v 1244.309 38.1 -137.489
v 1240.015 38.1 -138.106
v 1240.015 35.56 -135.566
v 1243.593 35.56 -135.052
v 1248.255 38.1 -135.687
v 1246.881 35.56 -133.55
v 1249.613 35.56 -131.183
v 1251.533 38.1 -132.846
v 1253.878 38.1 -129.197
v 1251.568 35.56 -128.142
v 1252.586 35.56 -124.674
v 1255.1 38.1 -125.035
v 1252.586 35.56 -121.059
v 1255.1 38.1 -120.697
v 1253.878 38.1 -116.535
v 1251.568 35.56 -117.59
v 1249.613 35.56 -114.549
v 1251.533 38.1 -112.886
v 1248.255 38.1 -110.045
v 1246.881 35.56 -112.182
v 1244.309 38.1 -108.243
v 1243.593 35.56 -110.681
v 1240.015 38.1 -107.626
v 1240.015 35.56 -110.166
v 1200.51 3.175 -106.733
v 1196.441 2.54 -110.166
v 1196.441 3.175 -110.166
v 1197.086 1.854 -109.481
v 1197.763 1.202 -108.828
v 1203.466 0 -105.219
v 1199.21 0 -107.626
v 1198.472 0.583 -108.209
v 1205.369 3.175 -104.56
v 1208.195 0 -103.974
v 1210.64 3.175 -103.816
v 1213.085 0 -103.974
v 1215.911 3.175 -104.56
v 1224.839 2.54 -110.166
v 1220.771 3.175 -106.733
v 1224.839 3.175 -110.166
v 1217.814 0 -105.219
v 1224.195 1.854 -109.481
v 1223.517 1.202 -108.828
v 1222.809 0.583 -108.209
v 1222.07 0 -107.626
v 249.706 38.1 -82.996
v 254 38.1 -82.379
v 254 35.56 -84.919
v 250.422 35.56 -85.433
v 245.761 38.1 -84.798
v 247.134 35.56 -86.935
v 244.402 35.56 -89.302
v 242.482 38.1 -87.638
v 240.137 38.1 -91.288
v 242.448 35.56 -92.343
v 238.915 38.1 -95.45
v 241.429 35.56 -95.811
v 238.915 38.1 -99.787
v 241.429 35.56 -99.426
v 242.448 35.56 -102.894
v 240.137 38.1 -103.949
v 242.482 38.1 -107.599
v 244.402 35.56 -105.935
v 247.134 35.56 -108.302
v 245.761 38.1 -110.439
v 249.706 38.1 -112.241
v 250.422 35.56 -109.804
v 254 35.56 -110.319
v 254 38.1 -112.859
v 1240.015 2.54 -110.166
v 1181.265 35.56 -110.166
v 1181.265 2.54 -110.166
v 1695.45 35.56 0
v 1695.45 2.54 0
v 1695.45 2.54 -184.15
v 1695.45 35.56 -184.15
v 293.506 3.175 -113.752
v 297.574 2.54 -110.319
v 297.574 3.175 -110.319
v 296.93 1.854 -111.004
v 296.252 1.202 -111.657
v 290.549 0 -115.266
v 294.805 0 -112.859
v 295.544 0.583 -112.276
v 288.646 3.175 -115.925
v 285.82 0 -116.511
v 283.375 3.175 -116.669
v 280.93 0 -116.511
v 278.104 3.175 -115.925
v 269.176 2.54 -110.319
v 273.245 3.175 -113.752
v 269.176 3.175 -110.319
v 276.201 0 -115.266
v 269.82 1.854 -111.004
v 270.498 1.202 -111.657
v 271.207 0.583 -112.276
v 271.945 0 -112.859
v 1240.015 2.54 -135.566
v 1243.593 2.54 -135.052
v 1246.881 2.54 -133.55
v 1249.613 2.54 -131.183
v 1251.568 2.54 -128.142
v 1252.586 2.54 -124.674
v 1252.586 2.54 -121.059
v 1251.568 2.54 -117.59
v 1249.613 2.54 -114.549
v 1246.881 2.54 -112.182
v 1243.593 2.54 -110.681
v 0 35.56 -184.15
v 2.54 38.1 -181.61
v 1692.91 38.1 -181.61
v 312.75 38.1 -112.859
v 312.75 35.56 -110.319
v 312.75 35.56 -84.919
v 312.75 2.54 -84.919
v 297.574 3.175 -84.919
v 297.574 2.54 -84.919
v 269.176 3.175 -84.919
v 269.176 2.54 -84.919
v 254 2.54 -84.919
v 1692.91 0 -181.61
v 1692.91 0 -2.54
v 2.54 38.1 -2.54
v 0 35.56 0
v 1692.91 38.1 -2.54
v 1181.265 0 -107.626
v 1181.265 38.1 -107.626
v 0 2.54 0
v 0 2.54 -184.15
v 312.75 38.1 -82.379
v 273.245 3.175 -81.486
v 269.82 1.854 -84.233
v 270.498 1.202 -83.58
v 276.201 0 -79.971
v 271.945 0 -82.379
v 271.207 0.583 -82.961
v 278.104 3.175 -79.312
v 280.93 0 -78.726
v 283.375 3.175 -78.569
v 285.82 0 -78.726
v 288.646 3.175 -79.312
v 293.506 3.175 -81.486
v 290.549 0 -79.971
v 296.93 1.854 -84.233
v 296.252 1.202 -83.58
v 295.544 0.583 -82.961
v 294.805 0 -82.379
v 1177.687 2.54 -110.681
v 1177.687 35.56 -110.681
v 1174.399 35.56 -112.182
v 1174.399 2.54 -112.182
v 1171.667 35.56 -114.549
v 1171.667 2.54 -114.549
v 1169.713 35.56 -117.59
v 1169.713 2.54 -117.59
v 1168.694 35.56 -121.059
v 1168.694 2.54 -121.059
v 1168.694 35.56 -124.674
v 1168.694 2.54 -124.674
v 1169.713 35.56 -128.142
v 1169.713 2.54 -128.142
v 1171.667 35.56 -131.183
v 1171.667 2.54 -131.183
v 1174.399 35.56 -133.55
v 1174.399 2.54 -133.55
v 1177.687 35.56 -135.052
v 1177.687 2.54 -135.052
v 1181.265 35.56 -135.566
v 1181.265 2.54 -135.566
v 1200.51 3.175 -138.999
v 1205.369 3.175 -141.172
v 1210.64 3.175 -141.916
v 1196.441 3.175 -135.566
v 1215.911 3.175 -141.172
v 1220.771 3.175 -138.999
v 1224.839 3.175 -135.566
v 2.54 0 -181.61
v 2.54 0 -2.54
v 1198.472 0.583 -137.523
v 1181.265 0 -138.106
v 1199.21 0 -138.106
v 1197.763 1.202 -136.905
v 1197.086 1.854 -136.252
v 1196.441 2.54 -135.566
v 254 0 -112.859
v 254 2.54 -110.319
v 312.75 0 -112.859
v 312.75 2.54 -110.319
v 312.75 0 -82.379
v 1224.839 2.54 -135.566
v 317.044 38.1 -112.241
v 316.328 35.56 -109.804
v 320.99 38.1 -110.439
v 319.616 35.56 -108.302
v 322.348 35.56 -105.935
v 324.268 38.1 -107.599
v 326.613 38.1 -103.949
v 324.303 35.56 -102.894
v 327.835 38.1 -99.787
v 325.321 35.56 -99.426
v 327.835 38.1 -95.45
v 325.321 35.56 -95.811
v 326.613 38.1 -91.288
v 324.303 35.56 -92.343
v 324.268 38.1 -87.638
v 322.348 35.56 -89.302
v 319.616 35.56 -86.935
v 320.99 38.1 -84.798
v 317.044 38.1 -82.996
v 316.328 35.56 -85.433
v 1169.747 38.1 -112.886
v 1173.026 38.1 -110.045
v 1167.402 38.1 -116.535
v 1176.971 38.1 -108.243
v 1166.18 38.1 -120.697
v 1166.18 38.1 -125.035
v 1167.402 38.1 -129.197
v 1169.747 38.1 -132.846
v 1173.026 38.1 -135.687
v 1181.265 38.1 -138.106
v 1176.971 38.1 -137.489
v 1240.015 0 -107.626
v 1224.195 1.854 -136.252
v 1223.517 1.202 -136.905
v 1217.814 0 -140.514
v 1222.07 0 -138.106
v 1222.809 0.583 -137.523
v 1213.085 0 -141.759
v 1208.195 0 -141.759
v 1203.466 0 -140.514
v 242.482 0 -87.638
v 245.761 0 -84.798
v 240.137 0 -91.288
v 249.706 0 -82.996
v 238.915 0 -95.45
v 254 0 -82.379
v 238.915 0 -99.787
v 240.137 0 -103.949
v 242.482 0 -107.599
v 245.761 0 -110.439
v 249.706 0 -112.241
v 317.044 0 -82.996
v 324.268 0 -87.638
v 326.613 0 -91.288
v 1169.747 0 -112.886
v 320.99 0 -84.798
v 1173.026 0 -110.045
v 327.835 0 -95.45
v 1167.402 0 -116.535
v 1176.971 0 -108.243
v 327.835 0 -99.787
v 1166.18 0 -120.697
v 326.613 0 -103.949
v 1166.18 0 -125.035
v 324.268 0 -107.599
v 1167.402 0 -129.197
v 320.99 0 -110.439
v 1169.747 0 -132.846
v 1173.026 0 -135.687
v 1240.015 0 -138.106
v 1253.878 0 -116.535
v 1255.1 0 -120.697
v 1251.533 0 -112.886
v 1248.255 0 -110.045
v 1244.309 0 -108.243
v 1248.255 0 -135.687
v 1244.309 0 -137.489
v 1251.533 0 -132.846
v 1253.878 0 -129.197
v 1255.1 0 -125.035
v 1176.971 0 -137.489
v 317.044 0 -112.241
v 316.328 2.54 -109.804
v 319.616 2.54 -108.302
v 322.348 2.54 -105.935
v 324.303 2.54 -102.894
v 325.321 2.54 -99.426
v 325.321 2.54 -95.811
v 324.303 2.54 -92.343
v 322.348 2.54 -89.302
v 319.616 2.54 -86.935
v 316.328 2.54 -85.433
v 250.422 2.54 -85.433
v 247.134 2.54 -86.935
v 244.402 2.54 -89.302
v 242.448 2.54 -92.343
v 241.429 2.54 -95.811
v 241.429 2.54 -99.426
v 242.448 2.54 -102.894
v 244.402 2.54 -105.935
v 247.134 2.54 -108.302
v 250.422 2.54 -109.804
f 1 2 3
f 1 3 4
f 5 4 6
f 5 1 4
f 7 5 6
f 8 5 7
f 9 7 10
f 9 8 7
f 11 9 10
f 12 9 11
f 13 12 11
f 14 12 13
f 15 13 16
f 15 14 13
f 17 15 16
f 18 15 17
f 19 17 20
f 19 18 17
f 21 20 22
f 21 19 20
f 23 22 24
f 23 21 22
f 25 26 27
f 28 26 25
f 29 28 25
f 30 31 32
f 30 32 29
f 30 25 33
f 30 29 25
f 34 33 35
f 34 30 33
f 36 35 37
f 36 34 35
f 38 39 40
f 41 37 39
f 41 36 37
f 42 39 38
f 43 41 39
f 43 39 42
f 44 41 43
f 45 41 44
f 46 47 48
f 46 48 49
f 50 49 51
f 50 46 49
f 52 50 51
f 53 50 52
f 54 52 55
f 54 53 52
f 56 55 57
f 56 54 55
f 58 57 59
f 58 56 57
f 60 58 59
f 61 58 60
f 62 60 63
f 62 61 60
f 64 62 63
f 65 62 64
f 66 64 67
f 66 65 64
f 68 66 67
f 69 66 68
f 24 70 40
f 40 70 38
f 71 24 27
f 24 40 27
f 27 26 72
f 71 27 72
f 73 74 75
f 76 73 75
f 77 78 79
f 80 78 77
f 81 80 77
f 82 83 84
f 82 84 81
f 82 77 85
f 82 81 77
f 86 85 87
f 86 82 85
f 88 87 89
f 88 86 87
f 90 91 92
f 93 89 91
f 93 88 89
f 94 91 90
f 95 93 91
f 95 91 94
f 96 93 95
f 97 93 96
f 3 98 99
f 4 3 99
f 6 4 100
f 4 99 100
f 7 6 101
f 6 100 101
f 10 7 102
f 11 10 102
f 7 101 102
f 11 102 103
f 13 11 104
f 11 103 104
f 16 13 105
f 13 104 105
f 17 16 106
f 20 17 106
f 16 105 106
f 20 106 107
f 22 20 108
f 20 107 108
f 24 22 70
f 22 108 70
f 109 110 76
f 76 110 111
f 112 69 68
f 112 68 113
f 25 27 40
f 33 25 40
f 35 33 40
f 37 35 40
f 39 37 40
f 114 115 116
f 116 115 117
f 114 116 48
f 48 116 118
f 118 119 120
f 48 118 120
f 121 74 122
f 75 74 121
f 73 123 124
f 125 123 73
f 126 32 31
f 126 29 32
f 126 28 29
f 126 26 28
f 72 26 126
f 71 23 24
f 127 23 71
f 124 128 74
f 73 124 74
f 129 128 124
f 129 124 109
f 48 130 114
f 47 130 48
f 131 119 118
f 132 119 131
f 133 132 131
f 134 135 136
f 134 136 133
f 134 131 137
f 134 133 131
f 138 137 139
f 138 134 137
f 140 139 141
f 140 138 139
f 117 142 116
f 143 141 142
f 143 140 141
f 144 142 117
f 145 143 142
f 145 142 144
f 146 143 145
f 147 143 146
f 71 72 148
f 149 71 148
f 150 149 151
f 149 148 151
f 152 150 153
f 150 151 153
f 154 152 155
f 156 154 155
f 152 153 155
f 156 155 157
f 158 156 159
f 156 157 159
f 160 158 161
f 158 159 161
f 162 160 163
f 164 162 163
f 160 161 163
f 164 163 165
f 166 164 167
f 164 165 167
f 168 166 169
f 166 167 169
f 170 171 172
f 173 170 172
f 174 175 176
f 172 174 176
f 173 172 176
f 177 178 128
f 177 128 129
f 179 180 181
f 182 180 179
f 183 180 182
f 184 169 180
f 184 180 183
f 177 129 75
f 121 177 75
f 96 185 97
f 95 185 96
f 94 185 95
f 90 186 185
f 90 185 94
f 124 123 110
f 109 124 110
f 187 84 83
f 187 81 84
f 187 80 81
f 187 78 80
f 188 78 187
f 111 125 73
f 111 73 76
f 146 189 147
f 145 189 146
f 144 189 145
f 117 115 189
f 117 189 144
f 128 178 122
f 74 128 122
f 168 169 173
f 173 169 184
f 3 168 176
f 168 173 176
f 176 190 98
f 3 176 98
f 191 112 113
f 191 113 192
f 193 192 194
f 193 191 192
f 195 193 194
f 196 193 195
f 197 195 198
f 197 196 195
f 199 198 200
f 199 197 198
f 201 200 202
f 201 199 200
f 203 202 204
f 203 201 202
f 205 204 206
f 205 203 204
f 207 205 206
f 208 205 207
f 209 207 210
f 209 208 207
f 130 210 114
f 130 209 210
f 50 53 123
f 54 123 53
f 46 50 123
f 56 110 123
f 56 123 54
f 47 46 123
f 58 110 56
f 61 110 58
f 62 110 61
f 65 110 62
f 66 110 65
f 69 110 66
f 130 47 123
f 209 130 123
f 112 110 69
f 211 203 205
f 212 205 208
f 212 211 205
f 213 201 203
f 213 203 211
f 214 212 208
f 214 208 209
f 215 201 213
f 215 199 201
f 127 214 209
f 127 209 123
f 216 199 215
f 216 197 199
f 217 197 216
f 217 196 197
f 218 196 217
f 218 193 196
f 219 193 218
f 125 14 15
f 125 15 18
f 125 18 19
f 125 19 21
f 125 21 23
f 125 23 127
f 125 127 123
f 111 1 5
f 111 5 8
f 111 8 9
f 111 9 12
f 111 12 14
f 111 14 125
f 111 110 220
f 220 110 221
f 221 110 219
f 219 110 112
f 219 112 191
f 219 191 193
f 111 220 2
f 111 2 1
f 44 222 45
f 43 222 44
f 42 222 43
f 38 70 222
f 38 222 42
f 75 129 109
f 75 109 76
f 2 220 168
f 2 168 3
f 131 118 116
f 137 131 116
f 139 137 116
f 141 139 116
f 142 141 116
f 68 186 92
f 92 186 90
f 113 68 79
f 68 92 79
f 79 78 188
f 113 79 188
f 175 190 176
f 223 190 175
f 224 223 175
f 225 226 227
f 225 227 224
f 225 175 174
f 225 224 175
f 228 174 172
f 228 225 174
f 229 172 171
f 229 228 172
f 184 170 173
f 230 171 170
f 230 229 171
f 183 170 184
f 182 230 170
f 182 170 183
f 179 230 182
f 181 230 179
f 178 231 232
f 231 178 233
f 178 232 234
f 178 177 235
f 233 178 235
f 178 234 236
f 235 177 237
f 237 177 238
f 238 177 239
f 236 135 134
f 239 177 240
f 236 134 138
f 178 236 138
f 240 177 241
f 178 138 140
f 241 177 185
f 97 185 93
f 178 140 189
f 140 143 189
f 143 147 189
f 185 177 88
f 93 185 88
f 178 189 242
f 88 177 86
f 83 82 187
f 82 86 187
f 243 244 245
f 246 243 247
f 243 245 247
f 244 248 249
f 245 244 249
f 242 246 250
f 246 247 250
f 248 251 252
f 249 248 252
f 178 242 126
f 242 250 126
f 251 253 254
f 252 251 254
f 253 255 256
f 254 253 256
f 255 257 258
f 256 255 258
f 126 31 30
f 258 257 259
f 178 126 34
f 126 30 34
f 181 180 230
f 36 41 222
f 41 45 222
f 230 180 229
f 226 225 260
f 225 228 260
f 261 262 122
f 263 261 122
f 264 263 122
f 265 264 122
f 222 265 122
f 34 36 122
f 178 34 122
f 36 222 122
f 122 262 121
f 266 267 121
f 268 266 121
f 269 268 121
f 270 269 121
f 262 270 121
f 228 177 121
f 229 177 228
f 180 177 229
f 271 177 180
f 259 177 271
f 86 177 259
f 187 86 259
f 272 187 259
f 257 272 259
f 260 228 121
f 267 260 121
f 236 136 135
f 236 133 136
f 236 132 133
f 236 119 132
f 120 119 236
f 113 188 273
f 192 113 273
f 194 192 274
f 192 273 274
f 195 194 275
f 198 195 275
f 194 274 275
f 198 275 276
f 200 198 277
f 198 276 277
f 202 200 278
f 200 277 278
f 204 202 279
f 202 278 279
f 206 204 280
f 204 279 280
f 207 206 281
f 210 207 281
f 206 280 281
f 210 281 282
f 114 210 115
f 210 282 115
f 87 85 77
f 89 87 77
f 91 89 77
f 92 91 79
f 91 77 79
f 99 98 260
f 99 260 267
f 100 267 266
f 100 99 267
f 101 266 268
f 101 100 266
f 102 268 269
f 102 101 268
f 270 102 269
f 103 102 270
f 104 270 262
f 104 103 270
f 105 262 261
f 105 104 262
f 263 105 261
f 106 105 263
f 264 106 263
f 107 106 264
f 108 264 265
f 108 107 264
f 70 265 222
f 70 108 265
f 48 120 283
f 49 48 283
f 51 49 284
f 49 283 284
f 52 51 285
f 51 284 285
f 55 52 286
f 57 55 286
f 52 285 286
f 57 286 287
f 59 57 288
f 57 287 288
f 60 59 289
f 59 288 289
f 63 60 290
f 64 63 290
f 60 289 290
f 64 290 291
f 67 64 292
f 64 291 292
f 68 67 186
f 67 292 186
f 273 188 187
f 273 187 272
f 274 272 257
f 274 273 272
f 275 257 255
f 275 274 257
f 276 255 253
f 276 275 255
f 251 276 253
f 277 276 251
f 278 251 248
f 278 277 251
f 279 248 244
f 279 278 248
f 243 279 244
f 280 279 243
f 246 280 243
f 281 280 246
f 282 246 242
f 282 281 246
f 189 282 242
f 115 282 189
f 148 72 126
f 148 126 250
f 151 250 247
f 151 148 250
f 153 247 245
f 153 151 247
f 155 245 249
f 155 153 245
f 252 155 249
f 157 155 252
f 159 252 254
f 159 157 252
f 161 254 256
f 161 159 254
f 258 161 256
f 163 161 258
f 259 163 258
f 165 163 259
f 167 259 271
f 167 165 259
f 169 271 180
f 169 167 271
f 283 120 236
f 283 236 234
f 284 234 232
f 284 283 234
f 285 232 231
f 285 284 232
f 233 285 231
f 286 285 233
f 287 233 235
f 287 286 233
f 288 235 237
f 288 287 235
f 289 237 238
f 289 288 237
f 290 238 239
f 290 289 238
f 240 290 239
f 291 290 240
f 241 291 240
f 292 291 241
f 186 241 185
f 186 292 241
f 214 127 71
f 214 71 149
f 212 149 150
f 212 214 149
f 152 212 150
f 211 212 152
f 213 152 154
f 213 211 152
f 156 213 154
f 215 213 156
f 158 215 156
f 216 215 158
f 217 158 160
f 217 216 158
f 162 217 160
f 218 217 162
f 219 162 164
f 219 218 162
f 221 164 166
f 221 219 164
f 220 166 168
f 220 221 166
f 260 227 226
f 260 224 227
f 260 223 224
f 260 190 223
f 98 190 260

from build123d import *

# Parameters (mm, degrees)
SKETCH1_W           = 1695.45
SKETCH1_H           = 184.15
BOSS_EXTRUDE1_DEPTH = 38.1
CHAMFER1_SIZE       = 2.54
CHAMFER2_SIZE       = 2.54
SKETCH2_R           = 19.05
CUT_EXTRUDE1_DEPTH  = 3.175


with BuildPart() as part:
    # Sketch1 → Boss-Extrude1 (new body)
    with BuildSketch(Plane(origin=(0, 0, 0), x_dir=(1, 0, 0), z_dir=(0, 1, 0))):
        with Locations((847.725, 92.075)):
            Rectangle(SKETCH1_W, SKETCH1_H)
        with BuildLine():
            Line((1240.0153, 110.16615), (1181.2651, 110.16615))
            ThreePointArc((1181.2651, 110.16615), (1168.5651, 122.86615), (1181.2651, 135.56615))
            Line((1181.2651, 135.56615), (1240.0153, 135.56615))
            ThreePointArc((1240.0153, 135.56615), (1252.7153, 122.86615), (1240.0153, 110.16615))
        make_face(mode=Mode.SUBTRACT)
        with BuildLine():
            Line((254, 110.31855), (312.7502, 110.31855))
            ThreePointArc((312.7502, 110.31855), (325.4502, 97.61855), (312.7502, 84.91855))
            Line((312.7502, 84.91855), (254, 84.91855))
            ThreePointArc((254, 84.91855), (241.3, 97.61855), (254, 110.31855))
        make_face(mode=Mode.SUBTRACT)
    extrude(amount=BOSS_EXTRUDE1_DEPTH)

    # Chamfer1
    chamfer1_edges = [part.edges().sort_by_distance(p)[0] for p in [
        (1695.45, 38.1, -92.075),
        (1252.7153, 38.1, -122.86615),
        (847.725, 38.1, -184.15),
        (1210.6402, 38.1, -135.56615),
        (1168.5651, 38.1, -122.86615),
        (1210.6402, 38.1, -110.16615),
        (325.4502, 38.1, -97.61855),
        (283.3751, 38.1, -110.31855),
        (241.3, 38.1, -97.61855),
        (283.3751, 38.1, -84.91855),
        (0, 38.1, -92.075),
        (847.725, 38.1, 0),
    ]]
    chamfer(chamfer1_edges, length=CHAMFER1_SIZE)

    # Chamfer2
    chamfer2_edges = [part.edges().sort_by_distance(p)[0] for p in [
        (1252.7153, 0, -122.86615),
        (1210.6402, 0, -135.56615),
        (1168.5651, 0, -122.86615),
        (1210.6402, 0, -110.16615),
        (325.4502, 0, -97.61855),
        (283.3751, 0, -110.31855),
        (241.3, 0, -97.61855),
        (283.3751, 0, -84.91855),
        (847.725, 0, -184.15),
        (1695.45, 0, -92.075),
        (847.725, 0, 0),
        (0, 0, -92.075),
    ]]
    chamfer(chamfer2_edges, length=CHAMFER2_SIZE)

    # Sketch2 → Cut-Extrude1 (cut)
    with BuildSketch(Plane(origin=(0, 0, 0), x_dir=(1, 0, 0), z_dir=(0, 1, 0))):
        with Locations((283.3751, 97.61855)):
            Circle(SKETCH2_R)
        with Locations((1210.6402, 122.86615)):
            Circle(SKETCH2_R)
    extrude(amount=CUT_EXTRUDE1_DEPTH, mode=Mode.SUBTRACT)


solid = part.part
